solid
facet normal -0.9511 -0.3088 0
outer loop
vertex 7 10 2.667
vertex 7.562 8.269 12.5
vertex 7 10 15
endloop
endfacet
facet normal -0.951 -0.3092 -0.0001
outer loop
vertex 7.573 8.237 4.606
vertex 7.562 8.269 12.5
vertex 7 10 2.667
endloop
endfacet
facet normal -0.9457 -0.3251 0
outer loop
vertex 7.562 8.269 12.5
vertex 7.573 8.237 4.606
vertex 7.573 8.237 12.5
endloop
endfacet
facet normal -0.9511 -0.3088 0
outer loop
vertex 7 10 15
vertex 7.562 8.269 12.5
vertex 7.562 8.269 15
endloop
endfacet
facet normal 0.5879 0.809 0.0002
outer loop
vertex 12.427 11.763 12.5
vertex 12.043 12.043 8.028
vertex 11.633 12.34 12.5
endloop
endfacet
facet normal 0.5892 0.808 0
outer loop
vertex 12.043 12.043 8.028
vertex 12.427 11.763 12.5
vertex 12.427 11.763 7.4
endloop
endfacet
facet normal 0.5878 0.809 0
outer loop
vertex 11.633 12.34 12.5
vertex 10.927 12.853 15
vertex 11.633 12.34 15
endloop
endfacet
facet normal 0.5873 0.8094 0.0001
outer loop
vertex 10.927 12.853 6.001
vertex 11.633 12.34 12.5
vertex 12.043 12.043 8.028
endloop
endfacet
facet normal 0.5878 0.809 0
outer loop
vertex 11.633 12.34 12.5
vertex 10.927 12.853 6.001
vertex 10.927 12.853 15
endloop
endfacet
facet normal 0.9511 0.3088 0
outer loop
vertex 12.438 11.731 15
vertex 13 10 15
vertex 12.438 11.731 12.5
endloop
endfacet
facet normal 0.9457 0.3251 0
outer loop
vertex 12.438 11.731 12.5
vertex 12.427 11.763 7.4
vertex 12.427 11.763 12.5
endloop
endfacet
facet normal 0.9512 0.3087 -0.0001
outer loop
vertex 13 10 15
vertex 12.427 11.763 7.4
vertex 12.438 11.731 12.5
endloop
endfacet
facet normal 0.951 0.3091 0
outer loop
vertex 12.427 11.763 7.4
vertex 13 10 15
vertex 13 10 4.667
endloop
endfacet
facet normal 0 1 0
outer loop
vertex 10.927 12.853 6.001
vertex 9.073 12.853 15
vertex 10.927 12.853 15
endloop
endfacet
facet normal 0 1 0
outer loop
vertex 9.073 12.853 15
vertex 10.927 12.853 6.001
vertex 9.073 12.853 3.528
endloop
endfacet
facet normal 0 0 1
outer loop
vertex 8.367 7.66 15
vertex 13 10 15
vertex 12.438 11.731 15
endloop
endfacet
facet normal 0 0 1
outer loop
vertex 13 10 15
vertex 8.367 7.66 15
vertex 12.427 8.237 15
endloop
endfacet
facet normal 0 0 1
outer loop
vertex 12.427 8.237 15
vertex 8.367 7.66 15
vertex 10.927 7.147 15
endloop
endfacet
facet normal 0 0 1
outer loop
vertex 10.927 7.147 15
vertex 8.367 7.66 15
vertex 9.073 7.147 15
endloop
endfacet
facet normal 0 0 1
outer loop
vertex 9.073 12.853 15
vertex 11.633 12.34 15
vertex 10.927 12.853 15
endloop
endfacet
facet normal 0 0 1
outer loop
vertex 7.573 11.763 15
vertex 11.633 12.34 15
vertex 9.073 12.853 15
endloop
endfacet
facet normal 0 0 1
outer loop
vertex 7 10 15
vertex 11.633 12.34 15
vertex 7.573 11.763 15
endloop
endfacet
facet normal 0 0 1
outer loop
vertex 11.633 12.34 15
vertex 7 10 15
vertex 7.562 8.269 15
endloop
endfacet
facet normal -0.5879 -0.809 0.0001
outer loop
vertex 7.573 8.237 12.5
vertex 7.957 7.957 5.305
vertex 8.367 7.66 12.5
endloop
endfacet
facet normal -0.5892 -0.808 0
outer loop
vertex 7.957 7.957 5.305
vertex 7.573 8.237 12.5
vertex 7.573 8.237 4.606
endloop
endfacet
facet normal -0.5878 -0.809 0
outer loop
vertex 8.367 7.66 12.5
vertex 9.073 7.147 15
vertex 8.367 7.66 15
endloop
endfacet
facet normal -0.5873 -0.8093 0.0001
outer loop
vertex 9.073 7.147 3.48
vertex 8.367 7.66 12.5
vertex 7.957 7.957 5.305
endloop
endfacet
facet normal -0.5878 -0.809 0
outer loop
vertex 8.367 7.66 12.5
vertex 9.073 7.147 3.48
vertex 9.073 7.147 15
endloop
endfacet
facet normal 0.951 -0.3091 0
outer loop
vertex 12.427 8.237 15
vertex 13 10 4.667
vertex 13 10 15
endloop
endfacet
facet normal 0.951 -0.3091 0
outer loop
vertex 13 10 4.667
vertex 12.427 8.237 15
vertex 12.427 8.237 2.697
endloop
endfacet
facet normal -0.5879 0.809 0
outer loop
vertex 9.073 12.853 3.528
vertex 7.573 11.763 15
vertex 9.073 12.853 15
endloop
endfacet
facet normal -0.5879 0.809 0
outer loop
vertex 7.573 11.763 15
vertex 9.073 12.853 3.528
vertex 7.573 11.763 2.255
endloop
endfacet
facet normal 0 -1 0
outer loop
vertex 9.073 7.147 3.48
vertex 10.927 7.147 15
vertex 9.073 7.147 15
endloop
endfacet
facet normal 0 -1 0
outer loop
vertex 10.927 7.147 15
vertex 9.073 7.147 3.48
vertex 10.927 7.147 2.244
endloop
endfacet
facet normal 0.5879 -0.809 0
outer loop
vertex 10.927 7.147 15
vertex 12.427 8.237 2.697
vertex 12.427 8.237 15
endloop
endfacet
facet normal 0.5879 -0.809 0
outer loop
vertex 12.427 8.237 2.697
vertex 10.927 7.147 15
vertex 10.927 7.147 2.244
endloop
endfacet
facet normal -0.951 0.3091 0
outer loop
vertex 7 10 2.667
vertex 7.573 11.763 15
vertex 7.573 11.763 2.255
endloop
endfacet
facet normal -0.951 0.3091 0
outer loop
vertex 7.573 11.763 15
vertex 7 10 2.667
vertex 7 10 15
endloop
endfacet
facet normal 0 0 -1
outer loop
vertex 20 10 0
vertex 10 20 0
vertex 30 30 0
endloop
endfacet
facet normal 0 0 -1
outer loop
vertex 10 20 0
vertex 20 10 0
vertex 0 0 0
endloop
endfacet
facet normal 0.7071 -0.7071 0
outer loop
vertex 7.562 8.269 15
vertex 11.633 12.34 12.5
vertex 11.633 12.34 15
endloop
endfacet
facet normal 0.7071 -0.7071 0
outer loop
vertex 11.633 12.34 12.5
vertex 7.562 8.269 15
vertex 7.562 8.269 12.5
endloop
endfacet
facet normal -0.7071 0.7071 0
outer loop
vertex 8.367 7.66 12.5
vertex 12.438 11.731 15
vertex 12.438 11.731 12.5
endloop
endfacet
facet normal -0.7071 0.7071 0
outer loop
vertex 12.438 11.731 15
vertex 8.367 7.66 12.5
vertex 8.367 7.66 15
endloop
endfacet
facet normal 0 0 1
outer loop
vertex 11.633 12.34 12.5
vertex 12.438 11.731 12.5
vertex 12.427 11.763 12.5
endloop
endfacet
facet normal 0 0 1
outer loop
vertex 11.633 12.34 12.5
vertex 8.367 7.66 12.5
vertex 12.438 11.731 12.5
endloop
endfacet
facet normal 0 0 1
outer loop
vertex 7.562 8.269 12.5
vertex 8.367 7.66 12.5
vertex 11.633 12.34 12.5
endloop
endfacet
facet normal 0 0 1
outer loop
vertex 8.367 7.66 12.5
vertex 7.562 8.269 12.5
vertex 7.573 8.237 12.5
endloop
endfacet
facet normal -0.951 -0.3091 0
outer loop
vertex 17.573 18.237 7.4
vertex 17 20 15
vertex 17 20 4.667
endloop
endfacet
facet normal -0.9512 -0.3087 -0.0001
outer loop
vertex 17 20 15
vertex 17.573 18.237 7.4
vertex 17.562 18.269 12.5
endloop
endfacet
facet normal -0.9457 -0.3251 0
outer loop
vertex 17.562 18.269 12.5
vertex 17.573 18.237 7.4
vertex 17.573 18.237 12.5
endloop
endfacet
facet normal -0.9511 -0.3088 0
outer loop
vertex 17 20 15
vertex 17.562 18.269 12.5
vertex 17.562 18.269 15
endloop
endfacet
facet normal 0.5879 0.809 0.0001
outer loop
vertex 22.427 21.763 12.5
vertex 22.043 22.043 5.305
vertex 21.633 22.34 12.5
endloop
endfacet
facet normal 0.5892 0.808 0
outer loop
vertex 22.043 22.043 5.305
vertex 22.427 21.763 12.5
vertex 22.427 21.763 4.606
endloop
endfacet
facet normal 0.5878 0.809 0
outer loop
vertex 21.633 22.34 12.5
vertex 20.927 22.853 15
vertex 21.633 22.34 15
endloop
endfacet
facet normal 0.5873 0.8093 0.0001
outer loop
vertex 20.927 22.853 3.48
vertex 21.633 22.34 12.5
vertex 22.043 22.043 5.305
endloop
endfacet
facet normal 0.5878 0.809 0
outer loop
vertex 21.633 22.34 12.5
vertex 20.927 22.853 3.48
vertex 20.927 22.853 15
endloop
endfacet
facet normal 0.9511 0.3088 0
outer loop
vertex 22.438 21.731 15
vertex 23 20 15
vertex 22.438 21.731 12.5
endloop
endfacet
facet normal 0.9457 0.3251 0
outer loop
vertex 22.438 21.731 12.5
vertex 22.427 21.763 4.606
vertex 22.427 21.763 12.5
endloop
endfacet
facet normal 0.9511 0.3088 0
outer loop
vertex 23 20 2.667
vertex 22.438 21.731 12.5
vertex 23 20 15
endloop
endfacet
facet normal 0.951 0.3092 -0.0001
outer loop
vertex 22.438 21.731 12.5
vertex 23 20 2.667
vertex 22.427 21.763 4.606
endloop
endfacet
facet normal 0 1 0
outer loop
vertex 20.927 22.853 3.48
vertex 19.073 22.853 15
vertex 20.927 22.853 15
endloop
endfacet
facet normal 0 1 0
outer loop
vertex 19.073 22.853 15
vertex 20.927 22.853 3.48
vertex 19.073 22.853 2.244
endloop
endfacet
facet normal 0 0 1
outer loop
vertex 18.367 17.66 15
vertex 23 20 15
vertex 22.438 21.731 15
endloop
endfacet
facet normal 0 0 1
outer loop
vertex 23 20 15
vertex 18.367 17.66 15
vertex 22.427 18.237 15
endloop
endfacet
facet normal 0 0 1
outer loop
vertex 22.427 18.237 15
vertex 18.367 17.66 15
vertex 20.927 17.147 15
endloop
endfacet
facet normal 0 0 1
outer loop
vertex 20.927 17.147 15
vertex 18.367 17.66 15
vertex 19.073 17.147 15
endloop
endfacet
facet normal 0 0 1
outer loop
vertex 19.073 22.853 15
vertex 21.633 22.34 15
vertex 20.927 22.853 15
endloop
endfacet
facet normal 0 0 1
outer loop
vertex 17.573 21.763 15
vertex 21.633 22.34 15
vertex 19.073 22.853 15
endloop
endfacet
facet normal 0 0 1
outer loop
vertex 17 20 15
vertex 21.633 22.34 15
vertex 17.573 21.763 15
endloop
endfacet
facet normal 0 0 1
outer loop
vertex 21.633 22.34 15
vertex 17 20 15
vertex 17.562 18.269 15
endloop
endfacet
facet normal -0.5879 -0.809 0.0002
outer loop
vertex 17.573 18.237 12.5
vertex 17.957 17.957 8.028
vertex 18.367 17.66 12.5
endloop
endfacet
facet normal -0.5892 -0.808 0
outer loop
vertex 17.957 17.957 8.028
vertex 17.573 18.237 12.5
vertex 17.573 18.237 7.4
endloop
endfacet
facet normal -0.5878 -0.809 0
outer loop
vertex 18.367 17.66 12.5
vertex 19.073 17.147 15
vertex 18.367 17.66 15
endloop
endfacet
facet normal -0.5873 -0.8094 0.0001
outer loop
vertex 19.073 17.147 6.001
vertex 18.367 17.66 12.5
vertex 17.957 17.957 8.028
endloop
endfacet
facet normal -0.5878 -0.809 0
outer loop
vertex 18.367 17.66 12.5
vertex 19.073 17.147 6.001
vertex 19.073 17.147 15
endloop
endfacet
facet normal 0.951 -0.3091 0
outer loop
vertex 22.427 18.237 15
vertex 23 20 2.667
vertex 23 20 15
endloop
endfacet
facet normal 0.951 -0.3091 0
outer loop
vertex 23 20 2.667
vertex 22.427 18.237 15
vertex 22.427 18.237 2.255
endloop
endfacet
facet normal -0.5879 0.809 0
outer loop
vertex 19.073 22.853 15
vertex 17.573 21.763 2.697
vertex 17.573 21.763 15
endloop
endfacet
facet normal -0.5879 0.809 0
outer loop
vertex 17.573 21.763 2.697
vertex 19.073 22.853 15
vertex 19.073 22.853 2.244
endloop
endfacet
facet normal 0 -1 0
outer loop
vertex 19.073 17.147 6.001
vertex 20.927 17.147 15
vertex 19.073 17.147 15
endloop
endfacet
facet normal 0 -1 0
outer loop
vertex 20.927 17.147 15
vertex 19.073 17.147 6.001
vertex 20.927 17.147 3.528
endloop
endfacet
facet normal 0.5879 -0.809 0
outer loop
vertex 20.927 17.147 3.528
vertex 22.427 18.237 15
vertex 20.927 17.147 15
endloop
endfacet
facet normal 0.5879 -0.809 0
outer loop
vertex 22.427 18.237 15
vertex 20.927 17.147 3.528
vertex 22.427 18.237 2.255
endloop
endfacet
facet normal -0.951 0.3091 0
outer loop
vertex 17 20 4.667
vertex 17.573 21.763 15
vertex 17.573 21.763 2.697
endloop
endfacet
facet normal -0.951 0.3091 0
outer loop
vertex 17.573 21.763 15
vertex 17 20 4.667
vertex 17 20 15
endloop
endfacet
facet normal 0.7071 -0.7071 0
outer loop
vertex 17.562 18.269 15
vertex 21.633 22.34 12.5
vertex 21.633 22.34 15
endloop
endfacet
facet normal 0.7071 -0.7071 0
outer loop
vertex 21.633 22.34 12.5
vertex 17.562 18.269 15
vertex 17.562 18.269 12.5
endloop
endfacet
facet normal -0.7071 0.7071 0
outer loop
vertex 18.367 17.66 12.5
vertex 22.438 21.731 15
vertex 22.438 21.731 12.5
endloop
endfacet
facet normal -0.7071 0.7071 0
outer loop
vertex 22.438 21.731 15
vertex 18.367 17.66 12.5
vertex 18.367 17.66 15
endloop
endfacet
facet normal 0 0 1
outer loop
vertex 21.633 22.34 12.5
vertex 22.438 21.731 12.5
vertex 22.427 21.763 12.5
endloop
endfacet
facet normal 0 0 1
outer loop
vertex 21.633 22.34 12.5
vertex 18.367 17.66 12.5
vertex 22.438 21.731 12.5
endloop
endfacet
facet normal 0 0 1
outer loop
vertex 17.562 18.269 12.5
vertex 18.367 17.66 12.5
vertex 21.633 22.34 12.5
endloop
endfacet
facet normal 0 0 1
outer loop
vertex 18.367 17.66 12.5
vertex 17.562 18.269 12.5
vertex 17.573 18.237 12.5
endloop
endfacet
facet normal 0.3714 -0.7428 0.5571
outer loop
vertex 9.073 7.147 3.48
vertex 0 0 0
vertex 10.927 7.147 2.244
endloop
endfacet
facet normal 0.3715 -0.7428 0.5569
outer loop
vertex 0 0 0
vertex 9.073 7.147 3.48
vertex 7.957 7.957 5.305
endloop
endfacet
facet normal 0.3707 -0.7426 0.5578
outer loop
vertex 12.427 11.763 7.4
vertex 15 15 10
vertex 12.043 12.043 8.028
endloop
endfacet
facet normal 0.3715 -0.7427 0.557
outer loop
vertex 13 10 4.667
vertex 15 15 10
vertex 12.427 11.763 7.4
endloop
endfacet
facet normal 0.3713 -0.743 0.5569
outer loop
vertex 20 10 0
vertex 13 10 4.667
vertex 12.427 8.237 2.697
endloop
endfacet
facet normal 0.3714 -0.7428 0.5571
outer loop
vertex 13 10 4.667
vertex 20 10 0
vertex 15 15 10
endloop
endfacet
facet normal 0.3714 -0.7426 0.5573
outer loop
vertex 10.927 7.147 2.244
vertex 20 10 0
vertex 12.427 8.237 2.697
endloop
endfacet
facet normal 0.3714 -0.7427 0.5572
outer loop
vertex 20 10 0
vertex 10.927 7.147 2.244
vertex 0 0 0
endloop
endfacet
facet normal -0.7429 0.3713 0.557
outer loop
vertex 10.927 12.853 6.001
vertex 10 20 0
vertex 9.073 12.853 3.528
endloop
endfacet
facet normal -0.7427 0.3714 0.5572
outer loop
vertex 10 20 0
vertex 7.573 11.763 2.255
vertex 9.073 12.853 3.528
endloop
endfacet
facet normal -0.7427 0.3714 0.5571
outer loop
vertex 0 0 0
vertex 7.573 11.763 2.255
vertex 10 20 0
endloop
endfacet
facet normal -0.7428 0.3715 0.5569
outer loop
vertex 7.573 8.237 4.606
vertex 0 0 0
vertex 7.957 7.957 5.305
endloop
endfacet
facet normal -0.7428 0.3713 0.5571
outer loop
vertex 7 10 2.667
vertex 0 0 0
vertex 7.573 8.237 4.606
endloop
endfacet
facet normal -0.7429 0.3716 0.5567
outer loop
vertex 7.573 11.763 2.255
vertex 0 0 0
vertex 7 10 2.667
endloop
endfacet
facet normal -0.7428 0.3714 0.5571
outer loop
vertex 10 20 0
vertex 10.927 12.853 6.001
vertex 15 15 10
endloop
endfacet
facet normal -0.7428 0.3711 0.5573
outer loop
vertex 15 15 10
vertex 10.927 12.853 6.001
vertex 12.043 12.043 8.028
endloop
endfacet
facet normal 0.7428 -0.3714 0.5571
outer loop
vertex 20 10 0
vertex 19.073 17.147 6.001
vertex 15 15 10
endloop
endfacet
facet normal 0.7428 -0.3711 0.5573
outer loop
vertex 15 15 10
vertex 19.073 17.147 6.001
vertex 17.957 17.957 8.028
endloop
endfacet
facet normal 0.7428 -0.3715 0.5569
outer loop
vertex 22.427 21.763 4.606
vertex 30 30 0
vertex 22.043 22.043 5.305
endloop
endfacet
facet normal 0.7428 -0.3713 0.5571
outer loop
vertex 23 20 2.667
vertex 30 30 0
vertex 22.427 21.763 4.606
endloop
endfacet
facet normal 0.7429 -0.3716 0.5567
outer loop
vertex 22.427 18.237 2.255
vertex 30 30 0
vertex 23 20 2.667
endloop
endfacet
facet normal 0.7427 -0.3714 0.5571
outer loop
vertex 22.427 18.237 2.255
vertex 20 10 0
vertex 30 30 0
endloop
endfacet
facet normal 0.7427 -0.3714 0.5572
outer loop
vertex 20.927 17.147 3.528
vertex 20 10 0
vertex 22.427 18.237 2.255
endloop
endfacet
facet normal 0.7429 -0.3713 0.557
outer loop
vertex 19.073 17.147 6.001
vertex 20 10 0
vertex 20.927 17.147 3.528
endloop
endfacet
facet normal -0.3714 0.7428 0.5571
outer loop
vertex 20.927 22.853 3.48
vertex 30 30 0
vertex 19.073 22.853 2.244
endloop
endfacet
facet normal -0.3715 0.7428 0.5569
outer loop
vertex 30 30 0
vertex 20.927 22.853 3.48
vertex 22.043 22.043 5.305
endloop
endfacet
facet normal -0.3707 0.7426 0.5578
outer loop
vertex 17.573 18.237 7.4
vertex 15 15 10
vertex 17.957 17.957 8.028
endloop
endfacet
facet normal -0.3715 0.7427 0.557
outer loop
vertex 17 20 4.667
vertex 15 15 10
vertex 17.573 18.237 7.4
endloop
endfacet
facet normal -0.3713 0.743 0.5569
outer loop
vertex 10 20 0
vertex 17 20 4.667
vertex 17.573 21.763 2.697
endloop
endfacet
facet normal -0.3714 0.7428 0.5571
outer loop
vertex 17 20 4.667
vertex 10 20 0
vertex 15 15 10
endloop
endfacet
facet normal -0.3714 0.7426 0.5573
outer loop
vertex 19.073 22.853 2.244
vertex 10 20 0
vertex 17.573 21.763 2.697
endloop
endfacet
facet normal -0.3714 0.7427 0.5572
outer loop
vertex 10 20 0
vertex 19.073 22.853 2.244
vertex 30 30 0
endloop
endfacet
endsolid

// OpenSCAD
//PaperHolder

//Width Of Slot
Width = 1;

//Depth Of Slot
Depth = 5;

polyhedron(
    points = [[0,0,0], [30,30,0], [15,15,10], [20,10,0], [10,20,0], ],
    faces = [[0,4,3], [1,3,4], [0,3,2], [0,2,4], [2,3,1], [2,1,4]]
);
translate([10,10,0]){
    difference(){
        cylinder(15,3,3);
        translate([0,0,15]){
            rotate([0,0,135]){
                cube([Width,6,Depth], center = true);
            }
        }
    }
}
translate([20,20,0]){
    difference(){
        cylinder(15,3,3);
        translate([0,0,15]){
            rotate([0,0,135]){
                cube([Width,6,Depth], center = true);
            }
        }
    }
}
